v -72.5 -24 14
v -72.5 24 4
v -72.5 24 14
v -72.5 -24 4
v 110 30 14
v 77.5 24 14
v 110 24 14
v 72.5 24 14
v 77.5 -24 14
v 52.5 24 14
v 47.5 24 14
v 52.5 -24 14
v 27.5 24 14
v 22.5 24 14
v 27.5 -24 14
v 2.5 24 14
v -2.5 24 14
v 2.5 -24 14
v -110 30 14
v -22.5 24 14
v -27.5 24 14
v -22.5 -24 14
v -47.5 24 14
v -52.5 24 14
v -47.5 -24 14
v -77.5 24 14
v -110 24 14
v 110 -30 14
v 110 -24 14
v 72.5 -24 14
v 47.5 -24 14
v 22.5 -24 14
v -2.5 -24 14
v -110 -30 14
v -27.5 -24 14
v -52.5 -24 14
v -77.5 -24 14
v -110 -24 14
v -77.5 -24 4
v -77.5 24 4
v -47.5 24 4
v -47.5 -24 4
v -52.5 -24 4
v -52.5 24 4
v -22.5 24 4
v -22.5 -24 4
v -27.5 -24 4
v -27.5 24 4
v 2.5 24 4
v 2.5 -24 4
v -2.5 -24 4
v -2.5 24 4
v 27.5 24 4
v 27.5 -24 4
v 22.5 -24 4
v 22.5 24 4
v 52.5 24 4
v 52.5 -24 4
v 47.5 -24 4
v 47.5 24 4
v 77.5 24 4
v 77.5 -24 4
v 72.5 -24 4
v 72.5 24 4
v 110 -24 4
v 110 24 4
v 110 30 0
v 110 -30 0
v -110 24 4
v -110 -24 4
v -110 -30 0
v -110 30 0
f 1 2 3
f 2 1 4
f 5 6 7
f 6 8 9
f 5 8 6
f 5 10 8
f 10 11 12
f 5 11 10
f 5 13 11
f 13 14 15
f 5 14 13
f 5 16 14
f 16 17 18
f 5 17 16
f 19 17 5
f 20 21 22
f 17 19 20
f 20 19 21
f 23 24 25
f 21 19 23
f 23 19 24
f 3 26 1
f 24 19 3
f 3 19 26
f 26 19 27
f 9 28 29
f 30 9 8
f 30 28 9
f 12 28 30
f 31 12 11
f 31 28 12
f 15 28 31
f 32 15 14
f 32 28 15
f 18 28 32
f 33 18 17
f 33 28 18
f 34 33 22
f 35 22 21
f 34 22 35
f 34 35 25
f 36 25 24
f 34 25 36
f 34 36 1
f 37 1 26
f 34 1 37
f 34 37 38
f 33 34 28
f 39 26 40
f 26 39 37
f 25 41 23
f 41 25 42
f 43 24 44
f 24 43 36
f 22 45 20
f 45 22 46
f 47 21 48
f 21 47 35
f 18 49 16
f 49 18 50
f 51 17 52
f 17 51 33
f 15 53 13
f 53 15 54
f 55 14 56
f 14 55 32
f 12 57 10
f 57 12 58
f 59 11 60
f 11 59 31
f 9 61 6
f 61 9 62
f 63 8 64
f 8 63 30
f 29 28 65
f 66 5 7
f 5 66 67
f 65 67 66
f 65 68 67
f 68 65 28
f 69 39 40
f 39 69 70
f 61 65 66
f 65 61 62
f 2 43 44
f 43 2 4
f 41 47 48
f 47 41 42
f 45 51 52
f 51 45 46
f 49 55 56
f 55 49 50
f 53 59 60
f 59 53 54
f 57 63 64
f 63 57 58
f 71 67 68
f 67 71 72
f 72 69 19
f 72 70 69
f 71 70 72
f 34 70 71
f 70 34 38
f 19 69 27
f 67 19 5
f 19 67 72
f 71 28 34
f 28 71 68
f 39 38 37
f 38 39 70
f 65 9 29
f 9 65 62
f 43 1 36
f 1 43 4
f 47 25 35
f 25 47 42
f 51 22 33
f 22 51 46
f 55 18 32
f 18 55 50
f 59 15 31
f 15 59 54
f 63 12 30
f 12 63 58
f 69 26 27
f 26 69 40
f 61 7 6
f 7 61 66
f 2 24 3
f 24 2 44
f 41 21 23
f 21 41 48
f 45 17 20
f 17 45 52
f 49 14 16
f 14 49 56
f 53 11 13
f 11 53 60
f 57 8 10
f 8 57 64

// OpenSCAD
$fn = 32;

// ----------------------------------------------------------------------
// Rib frame 220 x 60 x 14
// 7 ribs at 25 mm pitch
// ----------------------------------------------------------------------

// --- parameters (mm) ---
frame = [220, 60, 4];  // base plate size (x, y, z)
rail_w = 6;            // side rail width
ribs = 7;              // number of ribs
rib_t = 5;             // rib thickness
rib_h = 10;            // rib height above the base plate
pitch = 25;            // pitch between rib centres

// --- derived feature positions (mm) ---
span = (ribs - 1) * pitch;          // = 150   distance between the outer ribs
origin_x = -span / 2;               // = -75   X of the first rib
rib_len = frame[1] - 2 * rail_w + 2;  // = 50   rib length, 1 mm into each rail
feature_centers = [
  [origin_x + 0 * pitch, 0],
  [origin_x + 1 * pitch, 0],
  [origin_x + 2 * pitch, 0],
  [origin_x + 3 * pitch, 0],
  [origin_x + 4 * pitch, 0],
  [origin_x + 5 * pitch, 0],
  [origin_x + 6 * pitch, 0]
];   // rib centre line, drives the rib loop

// base plate, two side rails, then the ribs read straight off feature_centers
union() {
  translate([-frame[0] / 2, -frame[1] / 2, 0]) cube(frame);
  translate([-frame[0] / 2, -frame[1] / 2, 0]) cube([frame[0], rail_w, frame[2] + rib_h]);
  translate([-frame[0] / 2, frame[1] / 2 - rail_w, 0]) cube([frame[0], rail_w, frame[2] + rib_h]);
  for (centre = feature_centers)
    translate([centre[0] - rib_t / 2, centre[1] - rib_len / 2, frame[2] - 1])
      cube([rib_t, rib_len, rib_h + 1]);
}
